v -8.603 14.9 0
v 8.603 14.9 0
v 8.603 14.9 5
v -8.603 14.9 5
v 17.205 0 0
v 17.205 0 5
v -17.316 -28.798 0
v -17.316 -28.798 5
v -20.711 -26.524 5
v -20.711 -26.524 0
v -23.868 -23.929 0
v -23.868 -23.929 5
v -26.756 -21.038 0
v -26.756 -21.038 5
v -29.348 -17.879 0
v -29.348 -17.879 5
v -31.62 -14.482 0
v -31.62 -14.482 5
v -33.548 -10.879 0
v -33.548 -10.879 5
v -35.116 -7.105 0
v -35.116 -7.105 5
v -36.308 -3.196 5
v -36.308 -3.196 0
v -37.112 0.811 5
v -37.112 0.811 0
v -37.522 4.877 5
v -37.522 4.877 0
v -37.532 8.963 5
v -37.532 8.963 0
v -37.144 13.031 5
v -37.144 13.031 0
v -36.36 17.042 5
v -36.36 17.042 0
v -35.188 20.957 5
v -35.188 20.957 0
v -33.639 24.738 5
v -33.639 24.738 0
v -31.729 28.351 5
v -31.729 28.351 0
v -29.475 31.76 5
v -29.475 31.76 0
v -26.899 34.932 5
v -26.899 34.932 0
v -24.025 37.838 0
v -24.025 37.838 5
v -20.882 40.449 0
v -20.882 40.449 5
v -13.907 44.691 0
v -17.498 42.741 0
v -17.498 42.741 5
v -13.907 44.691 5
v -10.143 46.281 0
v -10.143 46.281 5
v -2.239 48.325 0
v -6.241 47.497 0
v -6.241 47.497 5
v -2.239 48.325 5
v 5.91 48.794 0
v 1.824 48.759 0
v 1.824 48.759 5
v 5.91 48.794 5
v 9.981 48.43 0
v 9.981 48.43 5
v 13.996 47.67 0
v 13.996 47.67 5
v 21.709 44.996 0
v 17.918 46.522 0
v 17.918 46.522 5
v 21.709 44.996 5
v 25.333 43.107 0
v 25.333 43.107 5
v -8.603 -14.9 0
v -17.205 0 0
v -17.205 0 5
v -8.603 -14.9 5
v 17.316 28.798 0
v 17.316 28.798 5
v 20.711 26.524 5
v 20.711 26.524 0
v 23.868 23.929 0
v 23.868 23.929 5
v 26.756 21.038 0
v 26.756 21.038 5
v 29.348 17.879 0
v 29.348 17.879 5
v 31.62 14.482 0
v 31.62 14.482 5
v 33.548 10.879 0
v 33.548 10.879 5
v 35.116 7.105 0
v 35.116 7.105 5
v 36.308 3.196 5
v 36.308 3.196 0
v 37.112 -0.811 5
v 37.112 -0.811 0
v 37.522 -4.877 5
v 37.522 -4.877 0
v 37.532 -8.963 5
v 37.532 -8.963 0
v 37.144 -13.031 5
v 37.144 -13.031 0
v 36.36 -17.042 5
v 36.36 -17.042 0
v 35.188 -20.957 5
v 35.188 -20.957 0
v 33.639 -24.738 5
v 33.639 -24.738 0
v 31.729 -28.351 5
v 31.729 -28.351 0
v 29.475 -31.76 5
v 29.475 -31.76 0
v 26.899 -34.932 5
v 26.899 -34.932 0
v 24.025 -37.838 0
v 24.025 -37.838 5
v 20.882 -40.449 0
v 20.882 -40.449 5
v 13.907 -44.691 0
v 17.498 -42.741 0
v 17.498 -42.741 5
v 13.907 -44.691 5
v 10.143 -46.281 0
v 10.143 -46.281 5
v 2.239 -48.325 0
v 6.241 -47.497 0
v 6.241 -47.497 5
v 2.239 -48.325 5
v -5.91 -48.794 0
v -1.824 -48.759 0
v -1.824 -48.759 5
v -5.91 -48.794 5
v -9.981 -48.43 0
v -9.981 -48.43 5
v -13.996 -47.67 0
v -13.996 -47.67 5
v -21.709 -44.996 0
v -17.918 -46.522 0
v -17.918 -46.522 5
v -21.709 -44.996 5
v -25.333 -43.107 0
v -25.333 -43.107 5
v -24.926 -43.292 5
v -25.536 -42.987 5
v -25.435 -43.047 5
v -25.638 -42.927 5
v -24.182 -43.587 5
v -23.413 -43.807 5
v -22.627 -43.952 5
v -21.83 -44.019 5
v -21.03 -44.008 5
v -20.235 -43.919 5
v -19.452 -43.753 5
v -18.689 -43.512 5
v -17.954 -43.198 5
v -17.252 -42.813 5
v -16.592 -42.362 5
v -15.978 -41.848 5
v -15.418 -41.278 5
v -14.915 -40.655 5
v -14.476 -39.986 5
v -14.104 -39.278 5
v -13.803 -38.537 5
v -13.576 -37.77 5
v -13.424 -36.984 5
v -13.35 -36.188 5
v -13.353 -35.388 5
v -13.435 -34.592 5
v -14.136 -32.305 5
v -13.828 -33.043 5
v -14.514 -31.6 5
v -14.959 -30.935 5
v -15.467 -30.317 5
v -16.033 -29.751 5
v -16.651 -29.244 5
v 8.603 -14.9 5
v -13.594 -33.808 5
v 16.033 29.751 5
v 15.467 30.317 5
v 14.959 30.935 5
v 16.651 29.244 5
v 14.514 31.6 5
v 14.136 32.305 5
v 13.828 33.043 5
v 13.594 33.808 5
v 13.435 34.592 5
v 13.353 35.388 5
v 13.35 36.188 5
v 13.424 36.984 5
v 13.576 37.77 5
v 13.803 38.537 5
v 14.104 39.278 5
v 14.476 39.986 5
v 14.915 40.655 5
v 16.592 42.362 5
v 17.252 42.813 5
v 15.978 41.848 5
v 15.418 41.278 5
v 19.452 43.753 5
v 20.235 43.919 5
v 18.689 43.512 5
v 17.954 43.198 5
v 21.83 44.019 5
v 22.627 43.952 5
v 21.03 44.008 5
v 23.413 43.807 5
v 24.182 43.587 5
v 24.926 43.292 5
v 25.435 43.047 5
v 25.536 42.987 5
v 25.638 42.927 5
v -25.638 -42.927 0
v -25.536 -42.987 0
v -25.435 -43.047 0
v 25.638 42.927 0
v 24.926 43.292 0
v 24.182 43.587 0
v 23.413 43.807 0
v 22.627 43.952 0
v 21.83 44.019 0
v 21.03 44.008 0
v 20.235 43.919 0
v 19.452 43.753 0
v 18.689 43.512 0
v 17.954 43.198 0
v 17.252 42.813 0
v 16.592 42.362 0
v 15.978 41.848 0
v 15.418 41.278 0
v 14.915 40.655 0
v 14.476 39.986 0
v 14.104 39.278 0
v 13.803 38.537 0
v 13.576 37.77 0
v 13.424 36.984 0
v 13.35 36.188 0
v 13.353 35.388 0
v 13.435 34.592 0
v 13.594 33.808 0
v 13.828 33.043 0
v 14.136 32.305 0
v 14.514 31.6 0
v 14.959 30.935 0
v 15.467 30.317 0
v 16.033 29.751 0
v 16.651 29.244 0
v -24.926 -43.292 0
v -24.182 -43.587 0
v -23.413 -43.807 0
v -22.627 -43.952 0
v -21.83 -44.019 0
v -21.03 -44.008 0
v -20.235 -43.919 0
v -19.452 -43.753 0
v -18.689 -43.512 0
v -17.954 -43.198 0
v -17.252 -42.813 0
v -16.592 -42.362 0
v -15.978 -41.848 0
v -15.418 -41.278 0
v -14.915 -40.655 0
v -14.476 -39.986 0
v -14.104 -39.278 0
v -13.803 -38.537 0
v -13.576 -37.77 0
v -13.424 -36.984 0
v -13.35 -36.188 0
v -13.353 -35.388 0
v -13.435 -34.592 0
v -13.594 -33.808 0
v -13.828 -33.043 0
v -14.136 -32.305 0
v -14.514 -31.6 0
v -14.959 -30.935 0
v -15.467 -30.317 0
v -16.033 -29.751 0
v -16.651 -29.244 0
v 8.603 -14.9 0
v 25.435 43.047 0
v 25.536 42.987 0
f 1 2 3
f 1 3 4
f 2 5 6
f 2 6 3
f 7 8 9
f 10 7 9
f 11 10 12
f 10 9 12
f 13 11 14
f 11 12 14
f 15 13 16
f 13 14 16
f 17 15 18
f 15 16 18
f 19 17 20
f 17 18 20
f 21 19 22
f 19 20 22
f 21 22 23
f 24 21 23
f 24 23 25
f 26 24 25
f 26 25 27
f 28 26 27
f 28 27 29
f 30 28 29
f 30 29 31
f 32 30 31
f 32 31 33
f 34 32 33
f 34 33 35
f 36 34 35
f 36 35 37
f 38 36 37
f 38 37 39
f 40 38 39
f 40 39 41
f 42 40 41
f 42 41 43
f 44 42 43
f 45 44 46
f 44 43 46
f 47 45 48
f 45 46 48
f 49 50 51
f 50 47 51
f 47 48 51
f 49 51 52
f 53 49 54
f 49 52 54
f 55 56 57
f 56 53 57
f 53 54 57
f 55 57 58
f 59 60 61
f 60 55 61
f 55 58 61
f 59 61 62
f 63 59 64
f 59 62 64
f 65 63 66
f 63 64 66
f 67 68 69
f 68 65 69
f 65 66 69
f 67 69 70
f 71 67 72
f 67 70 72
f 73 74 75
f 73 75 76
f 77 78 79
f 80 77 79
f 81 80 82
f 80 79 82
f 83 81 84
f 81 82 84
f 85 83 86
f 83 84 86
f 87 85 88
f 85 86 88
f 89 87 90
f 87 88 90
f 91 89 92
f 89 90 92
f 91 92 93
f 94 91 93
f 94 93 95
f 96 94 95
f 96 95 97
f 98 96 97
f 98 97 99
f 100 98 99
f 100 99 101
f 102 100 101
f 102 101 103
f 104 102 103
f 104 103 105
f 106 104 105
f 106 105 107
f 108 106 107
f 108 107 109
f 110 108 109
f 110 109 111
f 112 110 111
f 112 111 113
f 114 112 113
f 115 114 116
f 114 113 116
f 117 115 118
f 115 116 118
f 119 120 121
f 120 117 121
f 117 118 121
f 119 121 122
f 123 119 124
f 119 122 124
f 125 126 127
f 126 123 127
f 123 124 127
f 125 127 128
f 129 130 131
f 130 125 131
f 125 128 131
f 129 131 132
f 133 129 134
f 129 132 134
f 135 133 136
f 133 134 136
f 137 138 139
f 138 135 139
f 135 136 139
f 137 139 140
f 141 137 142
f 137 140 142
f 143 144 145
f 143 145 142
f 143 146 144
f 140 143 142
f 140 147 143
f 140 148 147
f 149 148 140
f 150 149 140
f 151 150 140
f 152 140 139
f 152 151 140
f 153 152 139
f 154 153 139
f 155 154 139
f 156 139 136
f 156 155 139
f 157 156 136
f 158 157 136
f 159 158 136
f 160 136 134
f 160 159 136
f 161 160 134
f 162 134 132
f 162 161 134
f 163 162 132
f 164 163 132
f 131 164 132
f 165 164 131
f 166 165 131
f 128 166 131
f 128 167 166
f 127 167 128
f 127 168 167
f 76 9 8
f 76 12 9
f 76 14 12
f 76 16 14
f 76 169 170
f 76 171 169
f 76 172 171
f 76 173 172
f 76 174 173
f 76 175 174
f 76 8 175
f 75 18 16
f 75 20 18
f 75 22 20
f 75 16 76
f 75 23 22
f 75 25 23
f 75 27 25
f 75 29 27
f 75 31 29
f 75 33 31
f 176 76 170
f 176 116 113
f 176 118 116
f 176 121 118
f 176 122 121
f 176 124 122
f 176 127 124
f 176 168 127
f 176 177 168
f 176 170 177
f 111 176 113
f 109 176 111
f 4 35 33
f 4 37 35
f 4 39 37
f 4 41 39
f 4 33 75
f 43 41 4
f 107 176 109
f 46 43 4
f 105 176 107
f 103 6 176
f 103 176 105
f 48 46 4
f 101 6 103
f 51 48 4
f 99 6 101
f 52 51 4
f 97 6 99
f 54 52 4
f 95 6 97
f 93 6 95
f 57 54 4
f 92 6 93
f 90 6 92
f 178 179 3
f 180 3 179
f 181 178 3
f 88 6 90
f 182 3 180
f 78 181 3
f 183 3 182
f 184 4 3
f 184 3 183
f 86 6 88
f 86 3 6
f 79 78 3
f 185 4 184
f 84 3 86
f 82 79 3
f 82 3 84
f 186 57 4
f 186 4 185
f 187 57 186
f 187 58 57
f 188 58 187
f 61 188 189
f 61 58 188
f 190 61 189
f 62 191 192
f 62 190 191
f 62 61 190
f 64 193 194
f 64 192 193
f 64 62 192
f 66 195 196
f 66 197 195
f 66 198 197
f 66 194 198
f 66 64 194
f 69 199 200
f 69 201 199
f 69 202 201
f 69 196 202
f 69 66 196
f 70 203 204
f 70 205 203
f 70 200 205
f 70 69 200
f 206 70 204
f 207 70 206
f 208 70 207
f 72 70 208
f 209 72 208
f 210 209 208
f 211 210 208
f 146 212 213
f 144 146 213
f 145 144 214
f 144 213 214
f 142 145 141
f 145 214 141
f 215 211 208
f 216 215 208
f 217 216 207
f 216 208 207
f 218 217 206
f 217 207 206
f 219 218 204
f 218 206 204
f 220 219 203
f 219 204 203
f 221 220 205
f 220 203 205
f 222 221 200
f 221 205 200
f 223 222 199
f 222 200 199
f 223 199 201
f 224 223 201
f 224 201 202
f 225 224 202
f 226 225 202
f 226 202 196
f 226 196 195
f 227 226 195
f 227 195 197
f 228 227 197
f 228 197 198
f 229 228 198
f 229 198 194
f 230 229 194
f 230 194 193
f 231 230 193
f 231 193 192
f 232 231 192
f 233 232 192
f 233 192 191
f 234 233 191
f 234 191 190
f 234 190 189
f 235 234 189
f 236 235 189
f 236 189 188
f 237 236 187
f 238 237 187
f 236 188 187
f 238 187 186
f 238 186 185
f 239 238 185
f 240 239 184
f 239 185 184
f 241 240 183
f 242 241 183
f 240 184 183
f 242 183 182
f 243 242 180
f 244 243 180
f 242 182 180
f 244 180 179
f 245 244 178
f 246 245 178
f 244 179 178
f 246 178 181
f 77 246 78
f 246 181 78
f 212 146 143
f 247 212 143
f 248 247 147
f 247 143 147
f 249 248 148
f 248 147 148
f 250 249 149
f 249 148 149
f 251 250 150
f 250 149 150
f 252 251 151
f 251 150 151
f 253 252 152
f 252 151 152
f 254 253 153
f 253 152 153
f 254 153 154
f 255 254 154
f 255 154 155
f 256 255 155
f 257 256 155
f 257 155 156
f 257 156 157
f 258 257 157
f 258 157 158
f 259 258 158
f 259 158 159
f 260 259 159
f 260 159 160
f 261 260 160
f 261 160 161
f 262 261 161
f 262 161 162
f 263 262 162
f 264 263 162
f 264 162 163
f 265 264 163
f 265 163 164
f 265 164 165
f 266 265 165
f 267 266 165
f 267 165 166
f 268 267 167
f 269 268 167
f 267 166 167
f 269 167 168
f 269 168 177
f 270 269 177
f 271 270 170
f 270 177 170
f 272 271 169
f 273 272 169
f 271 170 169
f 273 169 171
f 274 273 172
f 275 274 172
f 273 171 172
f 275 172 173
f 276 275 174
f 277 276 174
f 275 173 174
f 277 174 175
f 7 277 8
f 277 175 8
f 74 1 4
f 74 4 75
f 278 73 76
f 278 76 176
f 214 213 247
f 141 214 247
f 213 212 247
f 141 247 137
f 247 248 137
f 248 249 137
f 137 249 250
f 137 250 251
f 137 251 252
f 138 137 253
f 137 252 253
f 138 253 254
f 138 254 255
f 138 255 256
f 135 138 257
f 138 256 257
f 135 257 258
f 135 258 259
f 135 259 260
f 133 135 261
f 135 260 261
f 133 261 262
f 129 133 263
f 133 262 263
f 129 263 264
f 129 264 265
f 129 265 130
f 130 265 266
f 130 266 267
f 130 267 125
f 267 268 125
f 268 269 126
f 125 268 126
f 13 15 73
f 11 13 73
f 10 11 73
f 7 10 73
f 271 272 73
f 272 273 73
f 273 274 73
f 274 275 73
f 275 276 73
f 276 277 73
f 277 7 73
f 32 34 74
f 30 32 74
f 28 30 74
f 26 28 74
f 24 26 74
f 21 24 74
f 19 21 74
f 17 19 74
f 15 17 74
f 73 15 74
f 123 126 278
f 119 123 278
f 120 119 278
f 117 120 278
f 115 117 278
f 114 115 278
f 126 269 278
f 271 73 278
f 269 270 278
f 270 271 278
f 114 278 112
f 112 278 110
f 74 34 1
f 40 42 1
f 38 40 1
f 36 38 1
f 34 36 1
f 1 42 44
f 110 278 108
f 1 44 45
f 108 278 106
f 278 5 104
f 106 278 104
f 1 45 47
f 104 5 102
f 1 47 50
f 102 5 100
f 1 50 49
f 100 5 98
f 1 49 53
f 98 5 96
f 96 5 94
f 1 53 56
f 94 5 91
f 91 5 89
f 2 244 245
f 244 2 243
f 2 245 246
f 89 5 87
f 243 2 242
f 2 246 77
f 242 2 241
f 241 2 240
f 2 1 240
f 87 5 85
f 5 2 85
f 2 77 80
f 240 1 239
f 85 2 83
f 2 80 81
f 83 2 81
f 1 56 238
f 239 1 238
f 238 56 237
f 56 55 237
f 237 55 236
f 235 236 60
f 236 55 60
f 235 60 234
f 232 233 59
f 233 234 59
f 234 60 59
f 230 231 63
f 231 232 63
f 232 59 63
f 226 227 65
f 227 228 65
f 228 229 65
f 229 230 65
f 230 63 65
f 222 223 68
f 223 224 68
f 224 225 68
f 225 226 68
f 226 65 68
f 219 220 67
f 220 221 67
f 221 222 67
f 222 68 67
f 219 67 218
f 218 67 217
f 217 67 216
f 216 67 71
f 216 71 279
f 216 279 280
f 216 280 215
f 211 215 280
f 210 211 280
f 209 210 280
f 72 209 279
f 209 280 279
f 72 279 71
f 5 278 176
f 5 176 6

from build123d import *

# Parameters (mm, degrees)
ESBO_O1_R                = 50
RESSALTO_EXTRUS_O2_DEPTH = 5
CORTE_EXTRUS_O3_DEPTH    = 10


with BuildPart() as part:
    # Esboço1 → Ressalto-extrusão2 (new body)
    with BuildSketch(Plane.XY):
        Circle(ESBO_O1_R)
        Polygon((17.205038022, 0), (8.602519011, 14.9), (-8.602519011, 14.9), (-17.205038022, 0), (-8.602519011, -14.9), (8.602519011, -14.9), align=None, mode=Mode.SUBTRACT)
    extrude(amount=RESSALTO_EXTRUS_O2_DEPTH)

    # Esboço2 → Corte-extrusão3 (cut)
    with BuildSketch(Plane.XY.offset(5)):
        with BuildLine():
            ThreePointArc((17.315705324, 28.798343726), (31.728781641, -28.350948037), (-25.332809256, -43.107409748))
            ThreePointArc((-25.332809256, -43.107409748), (24.833037845, -43.397237601), (50, 0))
            ThreePointArc((50, 0), (43.485034201, 24.678974868), (25.637927978, 42.926642647))
            ThreePointArc((25.637927978, 42.926642647), (14.476168491, 39.986199306), (17.315705324, 28.798343726))
        make_face()
        with BuildLine():
            ThreePointArc((25.332809256, 43.107409748), (-43.017296722, 25.485528889), (-25.637927978, -42.926642647))
            ThreePointArc((-25.637927978, -42.926642647), (-14.476168491, -39.986199306), (-17.315705324, -28.798343726))
            ThreePointArc((-17.315705324, -28.798343726), (-31.728781641, 28.350948037), (25.332809256, 43.107409748))
        make_face()
    extrude(amount=-CORTE_EXTRUS_O3_DEPTH, mode=Mode.SUBTRACT)


solid = part.part
